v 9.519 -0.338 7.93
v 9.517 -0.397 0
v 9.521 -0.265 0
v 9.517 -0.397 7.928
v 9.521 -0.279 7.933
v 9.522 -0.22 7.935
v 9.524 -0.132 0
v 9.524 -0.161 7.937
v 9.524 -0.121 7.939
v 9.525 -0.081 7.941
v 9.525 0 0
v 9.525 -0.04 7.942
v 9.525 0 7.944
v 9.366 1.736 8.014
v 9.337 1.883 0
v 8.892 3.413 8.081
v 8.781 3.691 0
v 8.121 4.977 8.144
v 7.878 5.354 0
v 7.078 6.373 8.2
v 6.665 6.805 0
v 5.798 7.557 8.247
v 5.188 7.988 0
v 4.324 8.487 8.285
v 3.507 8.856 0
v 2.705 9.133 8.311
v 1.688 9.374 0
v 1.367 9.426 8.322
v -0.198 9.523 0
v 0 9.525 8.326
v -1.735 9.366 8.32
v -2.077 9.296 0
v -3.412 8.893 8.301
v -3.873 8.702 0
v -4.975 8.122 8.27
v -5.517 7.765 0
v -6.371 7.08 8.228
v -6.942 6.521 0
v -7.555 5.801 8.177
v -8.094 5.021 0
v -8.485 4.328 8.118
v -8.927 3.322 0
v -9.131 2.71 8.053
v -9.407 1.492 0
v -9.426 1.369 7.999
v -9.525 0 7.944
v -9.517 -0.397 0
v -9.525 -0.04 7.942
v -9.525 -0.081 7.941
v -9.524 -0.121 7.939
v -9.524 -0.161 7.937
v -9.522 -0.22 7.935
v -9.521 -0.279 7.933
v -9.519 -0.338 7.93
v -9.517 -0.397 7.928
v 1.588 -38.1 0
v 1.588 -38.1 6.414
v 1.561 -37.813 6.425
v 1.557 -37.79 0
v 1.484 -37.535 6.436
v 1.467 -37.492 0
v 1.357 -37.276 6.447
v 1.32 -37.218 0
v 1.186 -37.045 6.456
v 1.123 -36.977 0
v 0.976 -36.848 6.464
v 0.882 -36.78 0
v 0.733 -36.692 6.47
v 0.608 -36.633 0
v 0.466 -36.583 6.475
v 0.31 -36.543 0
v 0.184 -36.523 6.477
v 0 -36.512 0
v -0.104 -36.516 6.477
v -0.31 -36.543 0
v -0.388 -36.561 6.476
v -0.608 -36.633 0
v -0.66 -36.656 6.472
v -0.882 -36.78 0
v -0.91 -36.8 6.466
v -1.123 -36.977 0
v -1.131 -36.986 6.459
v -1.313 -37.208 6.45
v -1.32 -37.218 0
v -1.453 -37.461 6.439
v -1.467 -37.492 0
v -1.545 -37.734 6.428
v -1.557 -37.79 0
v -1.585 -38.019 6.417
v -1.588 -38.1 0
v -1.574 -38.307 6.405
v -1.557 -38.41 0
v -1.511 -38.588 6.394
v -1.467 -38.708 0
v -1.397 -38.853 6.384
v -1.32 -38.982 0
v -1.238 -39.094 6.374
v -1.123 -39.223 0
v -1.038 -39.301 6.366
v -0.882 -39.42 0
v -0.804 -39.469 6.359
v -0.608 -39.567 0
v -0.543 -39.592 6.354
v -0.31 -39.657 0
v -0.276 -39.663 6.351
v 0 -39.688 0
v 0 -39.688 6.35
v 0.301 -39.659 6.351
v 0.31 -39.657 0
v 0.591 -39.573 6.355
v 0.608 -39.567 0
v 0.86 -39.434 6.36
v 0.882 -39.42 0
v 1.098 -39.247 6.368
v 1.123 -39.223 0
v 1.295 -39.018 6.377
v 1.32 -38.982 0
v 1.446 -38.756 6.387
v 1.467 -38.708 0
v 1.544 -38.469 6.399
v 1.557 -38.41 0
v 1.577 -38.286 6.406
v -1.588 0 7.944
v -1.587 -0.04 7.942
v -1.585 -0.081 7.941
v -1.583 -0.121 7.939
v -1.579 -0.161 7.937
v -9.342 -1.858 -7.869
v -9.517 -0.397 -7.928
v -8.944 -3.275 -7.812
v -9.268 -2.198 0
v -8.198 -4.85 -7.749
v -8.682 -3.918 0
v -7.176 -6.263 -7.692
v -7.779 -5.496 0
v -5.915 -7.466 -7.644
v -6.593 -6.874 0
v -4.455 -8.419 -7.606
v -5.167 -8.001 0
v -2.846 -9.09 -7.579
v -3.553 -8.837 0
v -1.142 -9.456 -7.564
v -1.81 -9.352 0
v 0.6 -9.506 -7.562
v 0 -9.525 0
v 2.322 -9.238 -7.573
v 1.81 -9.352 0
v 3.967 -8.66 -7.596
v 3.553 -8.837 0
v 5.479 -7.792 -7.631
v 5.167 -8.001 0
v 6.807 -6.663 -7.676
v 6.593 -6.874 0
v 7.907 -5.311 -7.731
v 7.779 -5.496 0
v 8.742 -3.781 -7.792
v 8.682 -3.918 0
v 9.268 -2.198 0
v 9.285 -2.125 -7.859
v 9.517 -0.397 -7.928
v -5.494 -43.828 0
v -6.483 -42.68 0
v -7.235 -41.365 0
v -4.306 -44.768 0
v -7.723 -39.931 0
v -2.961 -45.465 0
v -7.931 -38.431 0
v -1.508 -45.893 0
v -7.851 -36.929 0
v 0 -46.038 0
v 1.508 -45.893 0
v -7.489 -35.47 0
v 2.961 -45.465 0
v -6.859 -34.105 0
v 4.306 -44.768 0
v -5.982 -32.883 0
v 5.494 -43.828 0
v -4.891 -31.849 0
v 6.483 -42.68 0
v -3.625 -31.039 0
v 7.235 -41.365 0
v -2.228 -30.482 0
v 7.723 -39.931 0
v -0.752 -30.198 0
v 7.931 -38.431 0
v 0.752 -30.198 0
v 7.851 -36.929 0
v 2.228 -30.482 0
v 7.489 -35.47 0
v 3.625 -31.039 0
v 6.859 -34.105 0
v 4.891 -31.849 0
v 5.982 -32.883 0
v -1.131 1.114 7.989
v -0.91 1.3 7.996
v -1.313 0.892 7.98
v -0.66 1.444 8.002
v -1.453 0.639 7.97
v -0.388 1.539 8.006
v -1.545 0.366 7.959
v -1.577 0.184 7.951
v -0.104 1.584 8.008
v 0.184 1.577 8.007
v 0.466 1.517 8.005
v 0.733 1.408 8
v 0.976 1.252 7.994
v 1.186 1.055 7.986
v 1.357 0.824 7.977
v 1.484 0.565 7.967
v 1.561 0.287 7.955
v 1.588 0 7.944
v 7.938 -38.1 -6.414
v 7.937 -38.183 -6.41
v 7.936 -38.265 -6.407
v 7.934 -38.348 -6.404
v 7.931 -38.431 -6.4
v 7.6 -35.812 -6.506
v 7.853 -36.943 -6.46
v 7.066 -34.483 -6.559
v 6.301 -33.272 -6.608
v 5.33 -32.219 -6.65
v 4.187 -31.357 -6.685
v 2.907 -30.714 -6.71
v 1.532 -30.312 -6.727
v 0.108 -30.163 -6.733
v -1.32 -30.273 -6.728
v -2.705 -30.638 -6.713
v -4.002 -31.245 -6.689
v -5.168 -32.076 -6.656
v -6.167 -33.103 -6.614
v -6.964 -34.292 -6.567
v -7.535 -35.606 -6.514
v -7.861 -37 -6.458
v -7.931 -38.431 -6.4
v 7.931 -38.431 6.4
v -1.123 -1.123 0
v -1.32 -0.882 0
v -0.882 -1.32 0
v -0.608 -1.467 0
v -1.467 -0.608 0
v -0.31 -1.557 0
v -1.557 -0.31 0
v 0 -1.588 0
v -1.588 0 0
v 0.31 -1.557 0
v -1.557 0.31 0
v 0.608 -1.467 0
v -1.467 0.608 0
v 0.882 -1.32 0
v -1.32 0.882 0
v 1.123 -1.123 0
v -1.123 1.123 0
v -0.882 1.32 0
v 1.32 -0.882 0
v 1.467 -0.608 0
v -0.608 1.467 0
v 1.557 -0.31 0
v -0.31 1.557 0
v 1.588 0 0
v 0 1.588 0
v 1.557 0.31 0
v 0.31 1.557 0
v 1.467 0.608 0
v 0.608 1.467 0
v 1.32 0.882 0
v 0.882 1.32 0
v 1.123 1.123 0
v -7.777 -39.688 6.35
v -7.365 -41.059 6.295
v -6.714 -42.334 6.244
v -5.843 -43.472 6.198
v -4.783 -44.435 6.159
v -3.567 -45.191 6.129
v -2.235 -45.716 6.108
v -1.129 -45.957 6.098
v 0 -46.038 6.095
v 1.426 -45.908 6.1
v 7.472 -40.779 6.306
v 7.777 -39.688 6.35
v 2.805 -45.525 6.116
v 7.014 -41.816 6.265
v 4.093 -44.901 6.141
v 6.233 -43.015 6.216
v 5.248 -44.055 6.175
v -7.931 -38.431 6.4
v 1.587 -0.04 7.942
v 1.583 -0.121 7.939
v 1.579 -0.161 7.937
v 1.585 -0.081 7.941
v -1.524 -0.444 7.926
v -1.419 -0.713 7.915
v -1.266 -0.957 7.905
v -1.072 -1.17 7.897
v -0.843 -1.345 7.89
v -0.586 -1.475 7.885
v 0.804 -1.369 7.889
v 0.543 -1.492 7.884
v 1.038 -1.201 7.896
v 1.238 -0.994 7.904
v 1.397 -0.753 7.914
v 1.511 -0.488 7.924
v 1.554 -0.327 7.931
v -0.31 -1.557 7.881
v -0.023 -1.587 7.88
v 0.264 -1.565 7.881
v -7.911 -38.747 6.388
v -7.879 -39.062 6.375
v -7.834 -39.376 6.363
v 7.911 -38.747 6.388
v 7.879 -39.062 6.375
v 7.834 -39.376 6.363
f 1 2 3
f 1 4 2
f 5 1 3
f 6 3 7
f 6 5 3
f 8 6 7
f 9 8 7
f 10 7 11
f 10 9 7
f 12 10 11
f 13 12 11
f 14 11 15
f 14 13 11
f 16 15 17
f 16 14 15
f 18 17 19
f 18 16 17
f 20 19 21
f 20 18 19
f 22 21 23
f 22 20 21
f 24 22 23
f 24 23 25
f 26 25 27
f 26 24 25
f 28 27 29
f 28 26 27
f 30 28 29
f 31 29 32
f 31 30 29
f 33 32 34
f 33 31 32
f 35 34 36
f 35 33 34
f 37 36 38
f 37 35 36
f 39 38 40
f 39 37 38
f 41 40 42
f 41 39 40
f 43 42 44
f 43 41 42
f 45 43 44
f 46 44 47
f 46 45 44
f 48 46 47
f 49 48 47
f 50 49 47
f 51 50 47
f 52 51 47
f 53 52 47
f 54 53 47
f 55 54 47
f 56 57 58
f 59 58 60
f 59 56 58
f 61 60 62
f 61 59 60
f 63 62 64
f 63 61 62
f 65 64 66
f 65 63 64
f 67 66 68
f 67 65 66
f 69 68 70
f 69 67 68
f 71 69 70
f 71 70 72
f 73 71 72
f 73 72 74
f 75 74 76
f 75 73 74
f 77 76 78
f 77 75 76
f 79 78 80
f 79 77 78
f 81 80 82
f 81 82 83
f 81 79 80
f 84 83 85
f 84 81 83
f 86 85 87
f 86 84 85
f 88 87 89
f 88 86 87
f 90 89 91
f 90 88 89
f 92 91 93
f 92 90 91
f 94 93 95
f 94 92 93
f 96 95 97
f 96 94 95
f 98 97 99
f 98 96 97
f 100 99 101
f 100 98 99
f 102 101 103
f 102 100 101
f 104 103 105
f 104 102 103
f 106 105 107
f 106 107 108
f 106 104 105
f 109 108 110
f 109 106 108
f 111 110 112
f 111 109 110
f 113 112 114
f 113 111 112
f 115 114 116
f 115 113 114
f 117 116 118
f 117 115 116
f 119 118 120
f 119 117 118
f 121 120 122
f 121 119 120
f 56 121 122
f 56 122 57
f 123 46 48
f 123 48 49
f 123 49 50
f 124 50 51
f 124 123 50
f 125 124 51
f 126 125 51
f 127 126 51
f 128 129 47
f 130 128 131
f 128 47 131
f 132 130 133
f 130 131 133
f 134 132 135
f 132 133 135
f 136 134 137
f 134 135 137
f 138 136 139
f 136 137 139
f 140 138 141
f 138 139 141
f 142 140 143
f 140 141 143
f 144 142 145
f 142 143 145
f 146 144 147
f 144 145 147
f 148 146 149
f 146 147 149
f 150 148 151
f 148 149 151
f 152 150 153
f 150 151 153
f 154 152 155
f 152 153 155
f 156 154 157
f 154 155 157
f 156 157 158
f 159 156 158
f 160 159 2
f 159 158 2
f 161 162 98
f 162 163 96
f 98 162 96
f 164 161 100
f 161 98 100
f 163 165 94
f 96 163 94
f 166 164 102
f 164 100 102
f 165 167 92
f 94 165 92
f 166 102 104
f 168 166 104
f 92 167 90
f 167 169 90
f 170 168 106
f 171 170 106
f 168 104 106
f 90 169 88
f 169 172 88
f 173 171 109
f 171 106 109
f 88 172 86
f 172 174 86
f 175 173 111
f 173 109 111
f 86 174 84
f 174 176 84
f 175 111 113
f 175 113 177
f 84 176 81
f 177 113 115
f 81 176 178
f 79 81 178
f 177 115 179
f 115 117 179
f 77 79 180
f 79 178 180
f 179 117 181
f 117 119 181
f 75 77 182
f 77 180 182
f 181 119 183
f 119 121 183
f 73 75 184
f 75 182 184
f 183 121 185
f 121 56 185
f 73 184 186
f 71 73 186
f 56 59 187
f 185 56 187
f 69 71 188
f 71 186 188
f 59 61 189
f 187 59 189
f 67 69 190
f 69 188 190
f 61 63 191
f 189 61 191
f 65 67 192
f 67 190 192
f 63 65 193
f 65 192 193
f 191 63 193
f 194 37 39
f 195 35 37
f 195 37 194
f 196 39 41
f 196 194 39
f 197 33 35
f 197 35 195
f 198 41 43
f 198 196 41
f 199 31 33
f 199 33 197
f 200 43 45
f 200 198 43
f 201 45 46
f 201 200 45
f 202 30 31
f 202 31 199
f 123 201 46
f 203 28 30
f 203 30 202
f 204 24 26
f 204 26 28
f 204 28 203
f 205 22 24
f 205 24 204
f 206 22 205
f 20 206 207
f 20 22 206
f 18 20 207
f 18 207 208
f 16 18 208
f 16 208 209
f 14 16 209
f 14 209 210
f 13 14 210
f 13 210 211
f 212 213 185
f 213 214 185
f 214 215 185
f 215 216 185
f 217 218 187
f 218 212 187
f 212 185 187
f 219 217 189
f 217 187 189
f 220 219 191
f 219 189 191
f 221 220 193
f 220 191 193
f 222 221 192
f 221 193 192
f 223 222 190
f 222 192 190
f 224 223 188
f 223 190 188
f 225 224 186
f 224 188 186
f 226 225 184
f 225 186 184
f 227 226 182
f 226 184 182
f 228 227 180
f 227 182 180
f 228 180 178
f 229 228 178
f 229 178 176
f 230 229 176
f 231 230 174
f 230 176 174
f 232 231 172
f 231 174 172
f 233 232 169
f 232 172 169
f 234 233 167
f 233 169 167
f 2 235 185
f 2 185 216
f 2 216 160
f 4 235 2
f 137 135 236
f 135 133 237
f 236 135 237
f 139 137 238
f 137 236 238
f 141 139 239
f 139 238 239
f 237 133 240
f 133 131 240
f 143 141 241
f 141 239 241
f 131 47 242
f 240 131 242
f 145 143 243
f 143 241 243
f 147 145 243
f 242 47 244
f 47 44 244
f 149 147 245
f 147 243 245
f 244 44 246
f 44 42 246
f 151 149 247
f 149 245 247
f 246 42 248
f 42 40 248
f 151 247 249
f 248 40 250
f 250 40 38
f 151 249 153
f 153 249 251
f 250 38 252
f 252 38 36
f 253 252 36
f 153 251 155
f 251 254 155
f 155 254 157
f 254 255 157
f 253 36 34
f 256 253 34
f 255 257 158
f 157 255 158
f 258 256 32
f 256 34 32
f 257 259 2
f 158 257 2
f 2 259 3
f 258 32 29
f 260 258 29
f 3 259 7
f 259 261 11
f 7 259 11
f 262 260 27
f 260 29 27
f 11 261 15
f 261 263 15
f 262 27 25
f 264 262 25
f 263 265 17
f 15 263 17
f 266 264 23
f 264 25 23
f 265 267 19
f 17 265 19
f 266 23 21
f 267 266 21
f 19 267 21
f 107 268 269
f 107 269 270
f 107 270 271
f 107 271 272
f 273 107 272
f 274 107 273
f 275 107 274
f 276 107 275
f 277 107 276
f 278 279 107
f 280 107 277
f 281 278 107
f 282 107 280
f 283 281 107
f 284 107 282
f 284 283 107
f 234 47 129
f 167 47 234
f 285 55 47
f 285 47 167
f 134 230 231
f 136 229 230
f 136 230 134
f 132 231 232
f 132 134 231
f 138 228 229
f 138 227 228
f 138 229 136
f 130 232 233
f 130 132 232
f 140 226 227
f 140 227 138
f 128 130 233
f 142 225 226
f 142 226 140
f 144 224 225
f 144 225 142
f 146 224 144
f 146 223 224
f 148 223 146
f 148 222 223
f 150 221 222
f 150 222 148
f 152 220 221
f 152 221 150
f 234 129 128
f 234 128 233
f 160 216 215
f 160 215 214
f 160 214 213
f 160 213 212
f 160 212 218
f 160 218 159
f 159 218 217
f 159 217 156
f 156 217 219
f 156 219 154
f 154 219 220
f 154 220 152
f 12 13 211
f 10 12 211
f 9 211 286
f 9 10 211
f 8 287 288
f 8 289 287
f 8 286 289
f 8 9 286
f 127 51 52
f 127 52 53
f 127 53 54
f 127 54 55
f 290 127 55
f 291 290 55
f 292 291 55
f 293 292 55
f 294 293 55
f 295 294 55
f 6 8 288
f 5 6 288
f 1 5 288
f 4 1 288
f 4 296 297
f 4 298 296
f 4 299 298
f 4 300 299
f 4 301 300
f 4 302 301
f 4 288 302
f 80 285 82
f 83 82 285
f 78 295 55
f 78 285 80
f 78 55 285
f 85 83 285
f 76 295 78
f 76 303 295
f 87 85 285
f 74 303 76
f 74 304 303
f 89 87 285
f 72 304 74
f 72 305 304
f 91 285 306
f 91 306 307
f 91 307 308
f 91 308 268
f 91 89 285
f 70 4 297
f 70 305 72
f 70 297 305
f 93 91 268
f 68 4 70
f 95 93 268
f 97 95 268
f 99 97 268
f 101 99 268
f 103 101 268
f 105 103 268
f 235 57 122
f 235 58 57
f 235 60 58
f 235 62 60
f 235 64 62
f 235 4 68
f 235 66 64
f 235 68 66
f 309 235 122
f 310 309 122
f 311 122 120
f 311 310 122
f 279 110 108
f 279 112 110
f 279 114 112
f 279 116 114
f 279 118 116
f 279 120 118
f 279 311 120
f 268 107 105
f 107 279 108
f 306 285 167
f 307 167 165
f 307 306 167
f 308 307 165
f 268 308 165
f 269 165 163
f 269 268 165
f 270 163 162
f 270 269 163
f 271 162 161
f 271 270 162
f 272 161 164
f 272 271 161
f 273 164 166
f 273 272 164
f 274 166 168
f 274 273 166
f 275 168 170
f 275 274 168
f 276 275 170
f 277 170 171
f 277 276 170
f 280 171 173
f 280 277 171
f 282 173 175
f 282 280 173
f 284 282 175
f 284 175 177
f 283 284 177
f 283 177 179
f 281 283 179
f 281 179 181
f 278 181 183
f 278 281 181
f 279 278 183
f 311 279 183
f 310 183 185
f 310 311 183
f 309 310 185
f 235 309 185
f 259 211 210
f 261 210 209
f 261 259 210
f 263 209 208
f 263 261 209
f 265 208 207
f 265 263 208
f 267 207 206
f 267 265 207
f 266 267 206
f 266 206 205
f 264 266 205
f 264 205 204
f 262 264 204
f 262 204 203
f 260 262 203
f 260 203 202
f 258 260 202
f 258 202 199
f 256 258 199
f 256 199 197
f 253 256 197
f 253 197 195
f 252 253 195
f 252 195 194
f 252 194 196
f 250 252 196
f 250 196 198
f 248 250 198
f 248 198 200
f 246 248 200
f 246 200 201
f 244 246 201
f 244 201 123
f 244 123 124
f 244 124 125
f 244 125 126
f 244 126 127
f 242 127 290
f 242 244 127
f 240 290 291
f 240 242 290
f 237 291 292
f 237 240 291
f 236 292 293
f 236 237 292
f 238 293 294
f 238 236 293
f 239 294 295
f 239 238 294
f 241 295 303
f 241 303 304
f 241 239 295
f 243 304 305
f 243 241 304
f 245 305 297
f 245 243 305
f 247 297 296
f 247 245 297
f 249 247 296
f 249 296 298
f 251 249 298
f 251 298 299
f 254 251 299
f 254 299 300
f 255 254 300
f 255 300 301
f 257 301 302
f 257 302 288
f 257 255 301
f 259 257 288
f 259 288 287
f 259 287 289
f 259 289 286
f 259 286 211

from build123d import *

# Parameters (mm, degrees)
F0_R     = 1.5875
F2_DEPTH = 12.7
F3_DEPTH = 12.7
F5_R     = 7.9375
F5_R_2   = 1.5875
F6_DEPTH = 25.4


with BuildPart() as f2:
    # F0 (on Top) → F2 (new body, symmetric)
    with BuildSketch(Plane.XY):
        with BuildLine():
            Line((7.930607, -38.430729), (9.516728, -0.396875))
            ThreePointArc((9.516728, -0.396875), (0, 9.525), (-9.516728, -0.396875))
            Line((-9.516728, -0.396875), (-7.930607, -38.430729))
            ThreePointArc((-7.930607, -38.430729), (0, -46.0375), (7.930607, -38.430729))
        make_face()
        with Locations((0, -38.1)):
            Circle(F0_R, mode=Mode.SUBTRACT)
        Circle(F0_R, mode=Mode.SUBTRACT)
    extrude(amount=F2_DEPTH, both=True)

    # F1 (on Right) → F3 (intersect, symmetric)
    with BuildSketch(Plane.YZ):
        Polygon((0, 7.943899), (-0.161479, 7.937414), (-39.6875, 6.35), (-46.0375, 6.094976), (-46.0375, -6.094976), (-39.6875, -6.35), (0, -7.943899), (9.525, -8.326434), (9.525, 8.326434), align=None)
    extrude(amount=F3_DEPTH, both=True, mode=Mode.INTERSECT)

    # F5 (on offset) → F6 (cut)
    with BuildSketch(Plane.XY):
        with BuildLine():
            ThreePointArc((-9.516728, -0.396875), (0, -9.525), (9.516728, -0.396875))
            ThreePointArc((9.516728, -0.396875), (9.522932, -0.198481), (9.525, 0))
            ThreePointArc((9.525, 0), (-0.198481, 9.522932), (-9.516728, -0.396875))
        make_face()
        with Locations((0, -38.1)):
            Circle(F5_R)
        with Locations((0, -38.1)):
            Circle(F5_R_2, mode=Mode.SUBTRACT)
    extrude(amount=-F6_DEPTH, mode=Mode.SUBTRACT)


solid = f2.part
